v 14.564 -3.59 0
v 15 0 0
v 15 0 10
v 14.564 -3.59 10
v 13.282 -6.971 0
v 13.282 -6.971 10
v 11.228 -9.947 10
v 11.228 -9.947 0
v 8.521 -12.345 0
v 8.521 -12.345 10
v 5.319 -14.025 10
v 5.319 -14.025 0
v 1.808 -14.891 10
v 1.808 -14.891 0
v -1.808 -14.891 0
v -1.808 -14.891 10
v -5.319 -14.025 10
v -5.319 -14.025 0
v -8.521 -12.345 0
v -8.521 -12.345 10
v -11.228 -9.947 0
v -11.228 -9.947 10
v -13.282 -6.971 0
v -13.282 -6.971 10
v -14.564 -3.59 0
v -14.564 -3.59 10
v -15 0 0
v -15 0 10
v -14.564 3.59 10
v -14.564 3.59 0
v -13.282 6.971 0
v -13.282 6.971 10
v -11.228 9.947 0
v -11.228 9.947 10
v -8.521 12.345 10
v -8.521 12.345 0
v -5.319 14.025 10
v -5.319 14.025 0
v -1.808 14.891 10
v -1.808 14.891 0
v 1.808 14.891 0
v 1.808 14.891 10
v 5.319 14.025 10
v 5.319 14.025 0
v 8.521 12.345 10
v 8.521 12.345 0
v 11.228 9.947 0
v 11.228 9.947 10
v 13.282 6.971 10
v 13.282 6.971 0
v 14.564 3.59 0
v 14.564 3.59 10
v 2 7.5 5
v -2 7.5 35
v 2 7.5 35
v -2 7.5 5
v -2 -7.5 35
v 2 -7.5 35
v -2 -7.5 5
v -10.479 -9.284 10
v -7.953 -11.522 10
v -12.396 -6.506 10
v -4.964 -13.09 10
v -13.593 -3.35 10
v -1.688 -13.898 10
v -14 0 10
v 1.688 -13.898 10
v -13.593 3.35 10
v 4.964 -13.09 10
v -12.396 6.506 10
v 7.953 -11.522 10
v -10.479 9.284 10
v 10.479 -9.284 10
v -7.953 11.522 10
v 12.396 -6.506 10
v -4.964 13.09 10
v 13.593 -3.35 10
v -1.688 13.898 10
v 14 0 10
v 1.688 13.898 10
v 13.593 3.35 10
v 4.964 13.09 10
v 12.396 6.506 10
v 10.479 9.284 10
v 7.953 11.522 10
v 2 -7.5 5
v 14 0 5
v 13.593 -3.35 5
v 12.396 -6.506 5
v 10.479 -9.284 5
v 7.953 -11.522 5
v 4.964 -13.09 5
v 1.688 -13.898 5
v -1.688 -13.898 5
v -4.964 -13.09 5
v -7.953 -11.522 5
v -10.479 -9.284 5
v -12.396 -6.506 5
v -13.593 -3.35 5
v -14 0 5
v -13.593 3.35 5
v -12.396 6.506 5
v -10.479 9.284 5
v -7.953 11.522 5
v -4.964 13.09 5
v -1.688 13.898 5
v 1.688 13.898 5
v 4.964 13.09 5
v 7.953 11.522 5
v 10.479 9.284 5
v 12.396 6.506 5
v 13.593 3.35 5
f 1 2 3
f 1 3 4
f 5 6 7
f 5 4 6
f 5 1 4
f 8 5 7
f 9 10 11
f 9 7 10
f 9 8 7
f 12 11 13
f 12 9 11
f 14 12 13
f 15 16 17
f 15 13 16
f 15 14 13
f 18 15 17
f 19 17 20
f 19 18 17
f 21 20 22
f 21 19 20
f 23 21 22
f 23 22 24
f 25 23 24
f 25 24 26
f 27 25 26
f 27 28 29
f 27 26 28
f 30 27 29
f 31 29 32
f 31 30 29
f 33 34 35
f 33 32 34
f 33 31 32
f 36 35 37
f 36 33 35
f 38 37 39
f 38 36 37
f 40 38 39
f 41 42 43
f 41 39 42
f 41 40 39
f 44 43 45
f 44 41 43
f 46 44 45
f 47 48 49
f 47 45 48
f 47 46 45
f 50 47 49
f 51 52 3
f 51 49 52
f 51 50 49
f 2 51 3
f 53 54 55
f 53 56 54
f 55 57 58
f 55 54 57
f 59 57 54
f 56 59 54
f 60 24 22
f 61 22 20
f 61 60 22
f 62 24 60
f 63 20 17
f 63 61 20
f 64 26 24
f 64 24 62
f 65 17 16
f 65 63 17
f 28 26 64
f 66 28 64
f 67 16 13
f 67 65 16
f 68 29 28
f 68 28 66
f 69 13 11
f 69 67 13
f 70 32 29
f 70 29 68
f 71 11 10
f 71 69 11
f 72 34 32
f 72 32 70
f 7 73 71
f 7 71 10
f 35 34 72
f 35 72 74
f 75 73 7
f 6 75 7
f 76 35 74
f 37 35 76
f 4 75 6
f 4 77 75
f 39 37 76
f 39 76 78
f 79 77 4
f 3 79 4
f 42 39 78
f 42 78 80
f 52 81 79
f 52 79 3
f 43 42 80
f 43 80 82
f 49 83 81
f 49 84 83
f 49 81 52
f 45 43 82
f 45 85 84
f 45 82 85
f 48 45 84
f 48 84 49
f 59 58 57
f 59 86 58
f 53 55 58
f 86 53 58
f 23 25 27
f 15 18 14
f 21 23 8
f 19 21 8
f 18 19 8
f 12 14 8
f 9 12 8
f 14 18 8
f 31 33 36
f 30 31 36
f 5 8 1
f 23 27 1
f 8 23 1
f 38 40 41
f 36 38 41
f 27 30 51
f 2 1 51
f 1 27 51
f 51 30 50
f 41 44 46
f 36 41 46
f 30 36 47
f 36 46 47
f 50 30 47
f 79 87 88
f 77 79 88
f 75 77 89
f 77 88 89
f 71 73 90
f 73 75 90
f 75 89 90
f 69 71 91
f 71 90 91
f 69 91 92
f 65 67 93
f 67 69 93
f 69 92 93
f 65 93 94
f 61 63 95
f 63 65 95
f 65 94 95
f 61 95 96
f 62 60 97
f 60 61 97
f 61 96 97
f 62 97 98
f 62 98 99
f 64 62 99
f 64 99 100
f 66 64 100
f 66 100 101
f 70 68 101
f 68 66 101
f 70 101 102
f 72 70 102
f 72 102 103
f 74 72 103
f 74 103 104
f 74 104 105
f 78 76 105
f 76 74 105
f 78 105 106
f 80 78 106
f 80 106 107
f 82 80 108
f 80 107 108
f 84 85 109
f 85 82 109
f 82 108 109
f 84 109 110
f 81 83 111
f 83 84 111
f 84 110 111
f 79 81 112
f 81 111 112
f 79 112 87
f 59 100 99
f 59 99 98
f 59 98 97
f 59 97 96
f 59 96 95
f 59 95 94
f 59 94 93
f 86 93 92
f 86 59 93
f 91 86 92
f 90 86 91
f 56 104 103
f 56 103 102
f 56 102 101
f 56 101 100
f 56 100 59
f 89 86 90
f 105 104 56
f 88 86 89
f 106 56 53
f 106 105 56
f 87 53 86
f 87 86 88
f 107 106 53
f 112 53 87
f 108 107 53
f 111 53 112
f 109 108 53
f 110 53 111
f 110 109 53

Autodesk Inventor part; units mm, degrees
ref_plane "YZ Plane" through (0, 0, 0) normal (1, 0, 0) x (0, 1, 0)
ref_plane "XZ Plane" through (0, 0, 0) normal (0, 1, 0) x (-1, 0, 0)
ref_plane "XY Plane" through (0, 0, 0) normal (0, 0, 1) x (1, 0, 0)
sketch "Sketch2" plane through (0, 0, 0) normal (0, 0, 1) x (1, 0, 0)
  line L0 (-21, 0) -> (21, 0) construction
  line L1 (0, -21) -> (0, 21) construction
  circle A0 centre (0, 0) radius 15
  dimension "d0" = 30
extrude "Extrusion1" add sketch "Sketch2" along normal blind 5
sketch "Sketch3" plane through (0, 0, 5) normal (0, 0, 1) x (1, 0, 0)
  line L0 (-21, 0) -> (21, 0) construction
  line L1 (0, -21) -> (0, 21) construction
  line L2 (-2, 7.5) -> (2, 7.5)
  line L3 (2, 7.5) -> (2, -7.5)
  line L4 (2, -7.5) -> (-2, -7.5)
  line L5 (-2, -7.5) -> (-2, 7.5)
  point P0 (0, 0)
  dimension "d3" = 2
  dimension "d5" = 15
extrude "Extrusion2" add sketch "Sketch3" along normal blind 30
sketch "Sketch4" plane through (0, 0, 5) normal (0, 0, 1) x (1, 0, 0)
  circle A0 centre (0, 0) radius 15 construction
  line L0 (0, -21) -> (0, 21) construction
  line L1 (-21, 0) -> (21, 0) construction
  circle A1 centre (0, 0) radius 14
  circle A2 centre (0, 0) radius 15
  dimension "d8" = 28
extrude "Extrusion3" add sketch "Sketch4" along normal blind 5
properties part number "P011_Chapeau_chambre"
